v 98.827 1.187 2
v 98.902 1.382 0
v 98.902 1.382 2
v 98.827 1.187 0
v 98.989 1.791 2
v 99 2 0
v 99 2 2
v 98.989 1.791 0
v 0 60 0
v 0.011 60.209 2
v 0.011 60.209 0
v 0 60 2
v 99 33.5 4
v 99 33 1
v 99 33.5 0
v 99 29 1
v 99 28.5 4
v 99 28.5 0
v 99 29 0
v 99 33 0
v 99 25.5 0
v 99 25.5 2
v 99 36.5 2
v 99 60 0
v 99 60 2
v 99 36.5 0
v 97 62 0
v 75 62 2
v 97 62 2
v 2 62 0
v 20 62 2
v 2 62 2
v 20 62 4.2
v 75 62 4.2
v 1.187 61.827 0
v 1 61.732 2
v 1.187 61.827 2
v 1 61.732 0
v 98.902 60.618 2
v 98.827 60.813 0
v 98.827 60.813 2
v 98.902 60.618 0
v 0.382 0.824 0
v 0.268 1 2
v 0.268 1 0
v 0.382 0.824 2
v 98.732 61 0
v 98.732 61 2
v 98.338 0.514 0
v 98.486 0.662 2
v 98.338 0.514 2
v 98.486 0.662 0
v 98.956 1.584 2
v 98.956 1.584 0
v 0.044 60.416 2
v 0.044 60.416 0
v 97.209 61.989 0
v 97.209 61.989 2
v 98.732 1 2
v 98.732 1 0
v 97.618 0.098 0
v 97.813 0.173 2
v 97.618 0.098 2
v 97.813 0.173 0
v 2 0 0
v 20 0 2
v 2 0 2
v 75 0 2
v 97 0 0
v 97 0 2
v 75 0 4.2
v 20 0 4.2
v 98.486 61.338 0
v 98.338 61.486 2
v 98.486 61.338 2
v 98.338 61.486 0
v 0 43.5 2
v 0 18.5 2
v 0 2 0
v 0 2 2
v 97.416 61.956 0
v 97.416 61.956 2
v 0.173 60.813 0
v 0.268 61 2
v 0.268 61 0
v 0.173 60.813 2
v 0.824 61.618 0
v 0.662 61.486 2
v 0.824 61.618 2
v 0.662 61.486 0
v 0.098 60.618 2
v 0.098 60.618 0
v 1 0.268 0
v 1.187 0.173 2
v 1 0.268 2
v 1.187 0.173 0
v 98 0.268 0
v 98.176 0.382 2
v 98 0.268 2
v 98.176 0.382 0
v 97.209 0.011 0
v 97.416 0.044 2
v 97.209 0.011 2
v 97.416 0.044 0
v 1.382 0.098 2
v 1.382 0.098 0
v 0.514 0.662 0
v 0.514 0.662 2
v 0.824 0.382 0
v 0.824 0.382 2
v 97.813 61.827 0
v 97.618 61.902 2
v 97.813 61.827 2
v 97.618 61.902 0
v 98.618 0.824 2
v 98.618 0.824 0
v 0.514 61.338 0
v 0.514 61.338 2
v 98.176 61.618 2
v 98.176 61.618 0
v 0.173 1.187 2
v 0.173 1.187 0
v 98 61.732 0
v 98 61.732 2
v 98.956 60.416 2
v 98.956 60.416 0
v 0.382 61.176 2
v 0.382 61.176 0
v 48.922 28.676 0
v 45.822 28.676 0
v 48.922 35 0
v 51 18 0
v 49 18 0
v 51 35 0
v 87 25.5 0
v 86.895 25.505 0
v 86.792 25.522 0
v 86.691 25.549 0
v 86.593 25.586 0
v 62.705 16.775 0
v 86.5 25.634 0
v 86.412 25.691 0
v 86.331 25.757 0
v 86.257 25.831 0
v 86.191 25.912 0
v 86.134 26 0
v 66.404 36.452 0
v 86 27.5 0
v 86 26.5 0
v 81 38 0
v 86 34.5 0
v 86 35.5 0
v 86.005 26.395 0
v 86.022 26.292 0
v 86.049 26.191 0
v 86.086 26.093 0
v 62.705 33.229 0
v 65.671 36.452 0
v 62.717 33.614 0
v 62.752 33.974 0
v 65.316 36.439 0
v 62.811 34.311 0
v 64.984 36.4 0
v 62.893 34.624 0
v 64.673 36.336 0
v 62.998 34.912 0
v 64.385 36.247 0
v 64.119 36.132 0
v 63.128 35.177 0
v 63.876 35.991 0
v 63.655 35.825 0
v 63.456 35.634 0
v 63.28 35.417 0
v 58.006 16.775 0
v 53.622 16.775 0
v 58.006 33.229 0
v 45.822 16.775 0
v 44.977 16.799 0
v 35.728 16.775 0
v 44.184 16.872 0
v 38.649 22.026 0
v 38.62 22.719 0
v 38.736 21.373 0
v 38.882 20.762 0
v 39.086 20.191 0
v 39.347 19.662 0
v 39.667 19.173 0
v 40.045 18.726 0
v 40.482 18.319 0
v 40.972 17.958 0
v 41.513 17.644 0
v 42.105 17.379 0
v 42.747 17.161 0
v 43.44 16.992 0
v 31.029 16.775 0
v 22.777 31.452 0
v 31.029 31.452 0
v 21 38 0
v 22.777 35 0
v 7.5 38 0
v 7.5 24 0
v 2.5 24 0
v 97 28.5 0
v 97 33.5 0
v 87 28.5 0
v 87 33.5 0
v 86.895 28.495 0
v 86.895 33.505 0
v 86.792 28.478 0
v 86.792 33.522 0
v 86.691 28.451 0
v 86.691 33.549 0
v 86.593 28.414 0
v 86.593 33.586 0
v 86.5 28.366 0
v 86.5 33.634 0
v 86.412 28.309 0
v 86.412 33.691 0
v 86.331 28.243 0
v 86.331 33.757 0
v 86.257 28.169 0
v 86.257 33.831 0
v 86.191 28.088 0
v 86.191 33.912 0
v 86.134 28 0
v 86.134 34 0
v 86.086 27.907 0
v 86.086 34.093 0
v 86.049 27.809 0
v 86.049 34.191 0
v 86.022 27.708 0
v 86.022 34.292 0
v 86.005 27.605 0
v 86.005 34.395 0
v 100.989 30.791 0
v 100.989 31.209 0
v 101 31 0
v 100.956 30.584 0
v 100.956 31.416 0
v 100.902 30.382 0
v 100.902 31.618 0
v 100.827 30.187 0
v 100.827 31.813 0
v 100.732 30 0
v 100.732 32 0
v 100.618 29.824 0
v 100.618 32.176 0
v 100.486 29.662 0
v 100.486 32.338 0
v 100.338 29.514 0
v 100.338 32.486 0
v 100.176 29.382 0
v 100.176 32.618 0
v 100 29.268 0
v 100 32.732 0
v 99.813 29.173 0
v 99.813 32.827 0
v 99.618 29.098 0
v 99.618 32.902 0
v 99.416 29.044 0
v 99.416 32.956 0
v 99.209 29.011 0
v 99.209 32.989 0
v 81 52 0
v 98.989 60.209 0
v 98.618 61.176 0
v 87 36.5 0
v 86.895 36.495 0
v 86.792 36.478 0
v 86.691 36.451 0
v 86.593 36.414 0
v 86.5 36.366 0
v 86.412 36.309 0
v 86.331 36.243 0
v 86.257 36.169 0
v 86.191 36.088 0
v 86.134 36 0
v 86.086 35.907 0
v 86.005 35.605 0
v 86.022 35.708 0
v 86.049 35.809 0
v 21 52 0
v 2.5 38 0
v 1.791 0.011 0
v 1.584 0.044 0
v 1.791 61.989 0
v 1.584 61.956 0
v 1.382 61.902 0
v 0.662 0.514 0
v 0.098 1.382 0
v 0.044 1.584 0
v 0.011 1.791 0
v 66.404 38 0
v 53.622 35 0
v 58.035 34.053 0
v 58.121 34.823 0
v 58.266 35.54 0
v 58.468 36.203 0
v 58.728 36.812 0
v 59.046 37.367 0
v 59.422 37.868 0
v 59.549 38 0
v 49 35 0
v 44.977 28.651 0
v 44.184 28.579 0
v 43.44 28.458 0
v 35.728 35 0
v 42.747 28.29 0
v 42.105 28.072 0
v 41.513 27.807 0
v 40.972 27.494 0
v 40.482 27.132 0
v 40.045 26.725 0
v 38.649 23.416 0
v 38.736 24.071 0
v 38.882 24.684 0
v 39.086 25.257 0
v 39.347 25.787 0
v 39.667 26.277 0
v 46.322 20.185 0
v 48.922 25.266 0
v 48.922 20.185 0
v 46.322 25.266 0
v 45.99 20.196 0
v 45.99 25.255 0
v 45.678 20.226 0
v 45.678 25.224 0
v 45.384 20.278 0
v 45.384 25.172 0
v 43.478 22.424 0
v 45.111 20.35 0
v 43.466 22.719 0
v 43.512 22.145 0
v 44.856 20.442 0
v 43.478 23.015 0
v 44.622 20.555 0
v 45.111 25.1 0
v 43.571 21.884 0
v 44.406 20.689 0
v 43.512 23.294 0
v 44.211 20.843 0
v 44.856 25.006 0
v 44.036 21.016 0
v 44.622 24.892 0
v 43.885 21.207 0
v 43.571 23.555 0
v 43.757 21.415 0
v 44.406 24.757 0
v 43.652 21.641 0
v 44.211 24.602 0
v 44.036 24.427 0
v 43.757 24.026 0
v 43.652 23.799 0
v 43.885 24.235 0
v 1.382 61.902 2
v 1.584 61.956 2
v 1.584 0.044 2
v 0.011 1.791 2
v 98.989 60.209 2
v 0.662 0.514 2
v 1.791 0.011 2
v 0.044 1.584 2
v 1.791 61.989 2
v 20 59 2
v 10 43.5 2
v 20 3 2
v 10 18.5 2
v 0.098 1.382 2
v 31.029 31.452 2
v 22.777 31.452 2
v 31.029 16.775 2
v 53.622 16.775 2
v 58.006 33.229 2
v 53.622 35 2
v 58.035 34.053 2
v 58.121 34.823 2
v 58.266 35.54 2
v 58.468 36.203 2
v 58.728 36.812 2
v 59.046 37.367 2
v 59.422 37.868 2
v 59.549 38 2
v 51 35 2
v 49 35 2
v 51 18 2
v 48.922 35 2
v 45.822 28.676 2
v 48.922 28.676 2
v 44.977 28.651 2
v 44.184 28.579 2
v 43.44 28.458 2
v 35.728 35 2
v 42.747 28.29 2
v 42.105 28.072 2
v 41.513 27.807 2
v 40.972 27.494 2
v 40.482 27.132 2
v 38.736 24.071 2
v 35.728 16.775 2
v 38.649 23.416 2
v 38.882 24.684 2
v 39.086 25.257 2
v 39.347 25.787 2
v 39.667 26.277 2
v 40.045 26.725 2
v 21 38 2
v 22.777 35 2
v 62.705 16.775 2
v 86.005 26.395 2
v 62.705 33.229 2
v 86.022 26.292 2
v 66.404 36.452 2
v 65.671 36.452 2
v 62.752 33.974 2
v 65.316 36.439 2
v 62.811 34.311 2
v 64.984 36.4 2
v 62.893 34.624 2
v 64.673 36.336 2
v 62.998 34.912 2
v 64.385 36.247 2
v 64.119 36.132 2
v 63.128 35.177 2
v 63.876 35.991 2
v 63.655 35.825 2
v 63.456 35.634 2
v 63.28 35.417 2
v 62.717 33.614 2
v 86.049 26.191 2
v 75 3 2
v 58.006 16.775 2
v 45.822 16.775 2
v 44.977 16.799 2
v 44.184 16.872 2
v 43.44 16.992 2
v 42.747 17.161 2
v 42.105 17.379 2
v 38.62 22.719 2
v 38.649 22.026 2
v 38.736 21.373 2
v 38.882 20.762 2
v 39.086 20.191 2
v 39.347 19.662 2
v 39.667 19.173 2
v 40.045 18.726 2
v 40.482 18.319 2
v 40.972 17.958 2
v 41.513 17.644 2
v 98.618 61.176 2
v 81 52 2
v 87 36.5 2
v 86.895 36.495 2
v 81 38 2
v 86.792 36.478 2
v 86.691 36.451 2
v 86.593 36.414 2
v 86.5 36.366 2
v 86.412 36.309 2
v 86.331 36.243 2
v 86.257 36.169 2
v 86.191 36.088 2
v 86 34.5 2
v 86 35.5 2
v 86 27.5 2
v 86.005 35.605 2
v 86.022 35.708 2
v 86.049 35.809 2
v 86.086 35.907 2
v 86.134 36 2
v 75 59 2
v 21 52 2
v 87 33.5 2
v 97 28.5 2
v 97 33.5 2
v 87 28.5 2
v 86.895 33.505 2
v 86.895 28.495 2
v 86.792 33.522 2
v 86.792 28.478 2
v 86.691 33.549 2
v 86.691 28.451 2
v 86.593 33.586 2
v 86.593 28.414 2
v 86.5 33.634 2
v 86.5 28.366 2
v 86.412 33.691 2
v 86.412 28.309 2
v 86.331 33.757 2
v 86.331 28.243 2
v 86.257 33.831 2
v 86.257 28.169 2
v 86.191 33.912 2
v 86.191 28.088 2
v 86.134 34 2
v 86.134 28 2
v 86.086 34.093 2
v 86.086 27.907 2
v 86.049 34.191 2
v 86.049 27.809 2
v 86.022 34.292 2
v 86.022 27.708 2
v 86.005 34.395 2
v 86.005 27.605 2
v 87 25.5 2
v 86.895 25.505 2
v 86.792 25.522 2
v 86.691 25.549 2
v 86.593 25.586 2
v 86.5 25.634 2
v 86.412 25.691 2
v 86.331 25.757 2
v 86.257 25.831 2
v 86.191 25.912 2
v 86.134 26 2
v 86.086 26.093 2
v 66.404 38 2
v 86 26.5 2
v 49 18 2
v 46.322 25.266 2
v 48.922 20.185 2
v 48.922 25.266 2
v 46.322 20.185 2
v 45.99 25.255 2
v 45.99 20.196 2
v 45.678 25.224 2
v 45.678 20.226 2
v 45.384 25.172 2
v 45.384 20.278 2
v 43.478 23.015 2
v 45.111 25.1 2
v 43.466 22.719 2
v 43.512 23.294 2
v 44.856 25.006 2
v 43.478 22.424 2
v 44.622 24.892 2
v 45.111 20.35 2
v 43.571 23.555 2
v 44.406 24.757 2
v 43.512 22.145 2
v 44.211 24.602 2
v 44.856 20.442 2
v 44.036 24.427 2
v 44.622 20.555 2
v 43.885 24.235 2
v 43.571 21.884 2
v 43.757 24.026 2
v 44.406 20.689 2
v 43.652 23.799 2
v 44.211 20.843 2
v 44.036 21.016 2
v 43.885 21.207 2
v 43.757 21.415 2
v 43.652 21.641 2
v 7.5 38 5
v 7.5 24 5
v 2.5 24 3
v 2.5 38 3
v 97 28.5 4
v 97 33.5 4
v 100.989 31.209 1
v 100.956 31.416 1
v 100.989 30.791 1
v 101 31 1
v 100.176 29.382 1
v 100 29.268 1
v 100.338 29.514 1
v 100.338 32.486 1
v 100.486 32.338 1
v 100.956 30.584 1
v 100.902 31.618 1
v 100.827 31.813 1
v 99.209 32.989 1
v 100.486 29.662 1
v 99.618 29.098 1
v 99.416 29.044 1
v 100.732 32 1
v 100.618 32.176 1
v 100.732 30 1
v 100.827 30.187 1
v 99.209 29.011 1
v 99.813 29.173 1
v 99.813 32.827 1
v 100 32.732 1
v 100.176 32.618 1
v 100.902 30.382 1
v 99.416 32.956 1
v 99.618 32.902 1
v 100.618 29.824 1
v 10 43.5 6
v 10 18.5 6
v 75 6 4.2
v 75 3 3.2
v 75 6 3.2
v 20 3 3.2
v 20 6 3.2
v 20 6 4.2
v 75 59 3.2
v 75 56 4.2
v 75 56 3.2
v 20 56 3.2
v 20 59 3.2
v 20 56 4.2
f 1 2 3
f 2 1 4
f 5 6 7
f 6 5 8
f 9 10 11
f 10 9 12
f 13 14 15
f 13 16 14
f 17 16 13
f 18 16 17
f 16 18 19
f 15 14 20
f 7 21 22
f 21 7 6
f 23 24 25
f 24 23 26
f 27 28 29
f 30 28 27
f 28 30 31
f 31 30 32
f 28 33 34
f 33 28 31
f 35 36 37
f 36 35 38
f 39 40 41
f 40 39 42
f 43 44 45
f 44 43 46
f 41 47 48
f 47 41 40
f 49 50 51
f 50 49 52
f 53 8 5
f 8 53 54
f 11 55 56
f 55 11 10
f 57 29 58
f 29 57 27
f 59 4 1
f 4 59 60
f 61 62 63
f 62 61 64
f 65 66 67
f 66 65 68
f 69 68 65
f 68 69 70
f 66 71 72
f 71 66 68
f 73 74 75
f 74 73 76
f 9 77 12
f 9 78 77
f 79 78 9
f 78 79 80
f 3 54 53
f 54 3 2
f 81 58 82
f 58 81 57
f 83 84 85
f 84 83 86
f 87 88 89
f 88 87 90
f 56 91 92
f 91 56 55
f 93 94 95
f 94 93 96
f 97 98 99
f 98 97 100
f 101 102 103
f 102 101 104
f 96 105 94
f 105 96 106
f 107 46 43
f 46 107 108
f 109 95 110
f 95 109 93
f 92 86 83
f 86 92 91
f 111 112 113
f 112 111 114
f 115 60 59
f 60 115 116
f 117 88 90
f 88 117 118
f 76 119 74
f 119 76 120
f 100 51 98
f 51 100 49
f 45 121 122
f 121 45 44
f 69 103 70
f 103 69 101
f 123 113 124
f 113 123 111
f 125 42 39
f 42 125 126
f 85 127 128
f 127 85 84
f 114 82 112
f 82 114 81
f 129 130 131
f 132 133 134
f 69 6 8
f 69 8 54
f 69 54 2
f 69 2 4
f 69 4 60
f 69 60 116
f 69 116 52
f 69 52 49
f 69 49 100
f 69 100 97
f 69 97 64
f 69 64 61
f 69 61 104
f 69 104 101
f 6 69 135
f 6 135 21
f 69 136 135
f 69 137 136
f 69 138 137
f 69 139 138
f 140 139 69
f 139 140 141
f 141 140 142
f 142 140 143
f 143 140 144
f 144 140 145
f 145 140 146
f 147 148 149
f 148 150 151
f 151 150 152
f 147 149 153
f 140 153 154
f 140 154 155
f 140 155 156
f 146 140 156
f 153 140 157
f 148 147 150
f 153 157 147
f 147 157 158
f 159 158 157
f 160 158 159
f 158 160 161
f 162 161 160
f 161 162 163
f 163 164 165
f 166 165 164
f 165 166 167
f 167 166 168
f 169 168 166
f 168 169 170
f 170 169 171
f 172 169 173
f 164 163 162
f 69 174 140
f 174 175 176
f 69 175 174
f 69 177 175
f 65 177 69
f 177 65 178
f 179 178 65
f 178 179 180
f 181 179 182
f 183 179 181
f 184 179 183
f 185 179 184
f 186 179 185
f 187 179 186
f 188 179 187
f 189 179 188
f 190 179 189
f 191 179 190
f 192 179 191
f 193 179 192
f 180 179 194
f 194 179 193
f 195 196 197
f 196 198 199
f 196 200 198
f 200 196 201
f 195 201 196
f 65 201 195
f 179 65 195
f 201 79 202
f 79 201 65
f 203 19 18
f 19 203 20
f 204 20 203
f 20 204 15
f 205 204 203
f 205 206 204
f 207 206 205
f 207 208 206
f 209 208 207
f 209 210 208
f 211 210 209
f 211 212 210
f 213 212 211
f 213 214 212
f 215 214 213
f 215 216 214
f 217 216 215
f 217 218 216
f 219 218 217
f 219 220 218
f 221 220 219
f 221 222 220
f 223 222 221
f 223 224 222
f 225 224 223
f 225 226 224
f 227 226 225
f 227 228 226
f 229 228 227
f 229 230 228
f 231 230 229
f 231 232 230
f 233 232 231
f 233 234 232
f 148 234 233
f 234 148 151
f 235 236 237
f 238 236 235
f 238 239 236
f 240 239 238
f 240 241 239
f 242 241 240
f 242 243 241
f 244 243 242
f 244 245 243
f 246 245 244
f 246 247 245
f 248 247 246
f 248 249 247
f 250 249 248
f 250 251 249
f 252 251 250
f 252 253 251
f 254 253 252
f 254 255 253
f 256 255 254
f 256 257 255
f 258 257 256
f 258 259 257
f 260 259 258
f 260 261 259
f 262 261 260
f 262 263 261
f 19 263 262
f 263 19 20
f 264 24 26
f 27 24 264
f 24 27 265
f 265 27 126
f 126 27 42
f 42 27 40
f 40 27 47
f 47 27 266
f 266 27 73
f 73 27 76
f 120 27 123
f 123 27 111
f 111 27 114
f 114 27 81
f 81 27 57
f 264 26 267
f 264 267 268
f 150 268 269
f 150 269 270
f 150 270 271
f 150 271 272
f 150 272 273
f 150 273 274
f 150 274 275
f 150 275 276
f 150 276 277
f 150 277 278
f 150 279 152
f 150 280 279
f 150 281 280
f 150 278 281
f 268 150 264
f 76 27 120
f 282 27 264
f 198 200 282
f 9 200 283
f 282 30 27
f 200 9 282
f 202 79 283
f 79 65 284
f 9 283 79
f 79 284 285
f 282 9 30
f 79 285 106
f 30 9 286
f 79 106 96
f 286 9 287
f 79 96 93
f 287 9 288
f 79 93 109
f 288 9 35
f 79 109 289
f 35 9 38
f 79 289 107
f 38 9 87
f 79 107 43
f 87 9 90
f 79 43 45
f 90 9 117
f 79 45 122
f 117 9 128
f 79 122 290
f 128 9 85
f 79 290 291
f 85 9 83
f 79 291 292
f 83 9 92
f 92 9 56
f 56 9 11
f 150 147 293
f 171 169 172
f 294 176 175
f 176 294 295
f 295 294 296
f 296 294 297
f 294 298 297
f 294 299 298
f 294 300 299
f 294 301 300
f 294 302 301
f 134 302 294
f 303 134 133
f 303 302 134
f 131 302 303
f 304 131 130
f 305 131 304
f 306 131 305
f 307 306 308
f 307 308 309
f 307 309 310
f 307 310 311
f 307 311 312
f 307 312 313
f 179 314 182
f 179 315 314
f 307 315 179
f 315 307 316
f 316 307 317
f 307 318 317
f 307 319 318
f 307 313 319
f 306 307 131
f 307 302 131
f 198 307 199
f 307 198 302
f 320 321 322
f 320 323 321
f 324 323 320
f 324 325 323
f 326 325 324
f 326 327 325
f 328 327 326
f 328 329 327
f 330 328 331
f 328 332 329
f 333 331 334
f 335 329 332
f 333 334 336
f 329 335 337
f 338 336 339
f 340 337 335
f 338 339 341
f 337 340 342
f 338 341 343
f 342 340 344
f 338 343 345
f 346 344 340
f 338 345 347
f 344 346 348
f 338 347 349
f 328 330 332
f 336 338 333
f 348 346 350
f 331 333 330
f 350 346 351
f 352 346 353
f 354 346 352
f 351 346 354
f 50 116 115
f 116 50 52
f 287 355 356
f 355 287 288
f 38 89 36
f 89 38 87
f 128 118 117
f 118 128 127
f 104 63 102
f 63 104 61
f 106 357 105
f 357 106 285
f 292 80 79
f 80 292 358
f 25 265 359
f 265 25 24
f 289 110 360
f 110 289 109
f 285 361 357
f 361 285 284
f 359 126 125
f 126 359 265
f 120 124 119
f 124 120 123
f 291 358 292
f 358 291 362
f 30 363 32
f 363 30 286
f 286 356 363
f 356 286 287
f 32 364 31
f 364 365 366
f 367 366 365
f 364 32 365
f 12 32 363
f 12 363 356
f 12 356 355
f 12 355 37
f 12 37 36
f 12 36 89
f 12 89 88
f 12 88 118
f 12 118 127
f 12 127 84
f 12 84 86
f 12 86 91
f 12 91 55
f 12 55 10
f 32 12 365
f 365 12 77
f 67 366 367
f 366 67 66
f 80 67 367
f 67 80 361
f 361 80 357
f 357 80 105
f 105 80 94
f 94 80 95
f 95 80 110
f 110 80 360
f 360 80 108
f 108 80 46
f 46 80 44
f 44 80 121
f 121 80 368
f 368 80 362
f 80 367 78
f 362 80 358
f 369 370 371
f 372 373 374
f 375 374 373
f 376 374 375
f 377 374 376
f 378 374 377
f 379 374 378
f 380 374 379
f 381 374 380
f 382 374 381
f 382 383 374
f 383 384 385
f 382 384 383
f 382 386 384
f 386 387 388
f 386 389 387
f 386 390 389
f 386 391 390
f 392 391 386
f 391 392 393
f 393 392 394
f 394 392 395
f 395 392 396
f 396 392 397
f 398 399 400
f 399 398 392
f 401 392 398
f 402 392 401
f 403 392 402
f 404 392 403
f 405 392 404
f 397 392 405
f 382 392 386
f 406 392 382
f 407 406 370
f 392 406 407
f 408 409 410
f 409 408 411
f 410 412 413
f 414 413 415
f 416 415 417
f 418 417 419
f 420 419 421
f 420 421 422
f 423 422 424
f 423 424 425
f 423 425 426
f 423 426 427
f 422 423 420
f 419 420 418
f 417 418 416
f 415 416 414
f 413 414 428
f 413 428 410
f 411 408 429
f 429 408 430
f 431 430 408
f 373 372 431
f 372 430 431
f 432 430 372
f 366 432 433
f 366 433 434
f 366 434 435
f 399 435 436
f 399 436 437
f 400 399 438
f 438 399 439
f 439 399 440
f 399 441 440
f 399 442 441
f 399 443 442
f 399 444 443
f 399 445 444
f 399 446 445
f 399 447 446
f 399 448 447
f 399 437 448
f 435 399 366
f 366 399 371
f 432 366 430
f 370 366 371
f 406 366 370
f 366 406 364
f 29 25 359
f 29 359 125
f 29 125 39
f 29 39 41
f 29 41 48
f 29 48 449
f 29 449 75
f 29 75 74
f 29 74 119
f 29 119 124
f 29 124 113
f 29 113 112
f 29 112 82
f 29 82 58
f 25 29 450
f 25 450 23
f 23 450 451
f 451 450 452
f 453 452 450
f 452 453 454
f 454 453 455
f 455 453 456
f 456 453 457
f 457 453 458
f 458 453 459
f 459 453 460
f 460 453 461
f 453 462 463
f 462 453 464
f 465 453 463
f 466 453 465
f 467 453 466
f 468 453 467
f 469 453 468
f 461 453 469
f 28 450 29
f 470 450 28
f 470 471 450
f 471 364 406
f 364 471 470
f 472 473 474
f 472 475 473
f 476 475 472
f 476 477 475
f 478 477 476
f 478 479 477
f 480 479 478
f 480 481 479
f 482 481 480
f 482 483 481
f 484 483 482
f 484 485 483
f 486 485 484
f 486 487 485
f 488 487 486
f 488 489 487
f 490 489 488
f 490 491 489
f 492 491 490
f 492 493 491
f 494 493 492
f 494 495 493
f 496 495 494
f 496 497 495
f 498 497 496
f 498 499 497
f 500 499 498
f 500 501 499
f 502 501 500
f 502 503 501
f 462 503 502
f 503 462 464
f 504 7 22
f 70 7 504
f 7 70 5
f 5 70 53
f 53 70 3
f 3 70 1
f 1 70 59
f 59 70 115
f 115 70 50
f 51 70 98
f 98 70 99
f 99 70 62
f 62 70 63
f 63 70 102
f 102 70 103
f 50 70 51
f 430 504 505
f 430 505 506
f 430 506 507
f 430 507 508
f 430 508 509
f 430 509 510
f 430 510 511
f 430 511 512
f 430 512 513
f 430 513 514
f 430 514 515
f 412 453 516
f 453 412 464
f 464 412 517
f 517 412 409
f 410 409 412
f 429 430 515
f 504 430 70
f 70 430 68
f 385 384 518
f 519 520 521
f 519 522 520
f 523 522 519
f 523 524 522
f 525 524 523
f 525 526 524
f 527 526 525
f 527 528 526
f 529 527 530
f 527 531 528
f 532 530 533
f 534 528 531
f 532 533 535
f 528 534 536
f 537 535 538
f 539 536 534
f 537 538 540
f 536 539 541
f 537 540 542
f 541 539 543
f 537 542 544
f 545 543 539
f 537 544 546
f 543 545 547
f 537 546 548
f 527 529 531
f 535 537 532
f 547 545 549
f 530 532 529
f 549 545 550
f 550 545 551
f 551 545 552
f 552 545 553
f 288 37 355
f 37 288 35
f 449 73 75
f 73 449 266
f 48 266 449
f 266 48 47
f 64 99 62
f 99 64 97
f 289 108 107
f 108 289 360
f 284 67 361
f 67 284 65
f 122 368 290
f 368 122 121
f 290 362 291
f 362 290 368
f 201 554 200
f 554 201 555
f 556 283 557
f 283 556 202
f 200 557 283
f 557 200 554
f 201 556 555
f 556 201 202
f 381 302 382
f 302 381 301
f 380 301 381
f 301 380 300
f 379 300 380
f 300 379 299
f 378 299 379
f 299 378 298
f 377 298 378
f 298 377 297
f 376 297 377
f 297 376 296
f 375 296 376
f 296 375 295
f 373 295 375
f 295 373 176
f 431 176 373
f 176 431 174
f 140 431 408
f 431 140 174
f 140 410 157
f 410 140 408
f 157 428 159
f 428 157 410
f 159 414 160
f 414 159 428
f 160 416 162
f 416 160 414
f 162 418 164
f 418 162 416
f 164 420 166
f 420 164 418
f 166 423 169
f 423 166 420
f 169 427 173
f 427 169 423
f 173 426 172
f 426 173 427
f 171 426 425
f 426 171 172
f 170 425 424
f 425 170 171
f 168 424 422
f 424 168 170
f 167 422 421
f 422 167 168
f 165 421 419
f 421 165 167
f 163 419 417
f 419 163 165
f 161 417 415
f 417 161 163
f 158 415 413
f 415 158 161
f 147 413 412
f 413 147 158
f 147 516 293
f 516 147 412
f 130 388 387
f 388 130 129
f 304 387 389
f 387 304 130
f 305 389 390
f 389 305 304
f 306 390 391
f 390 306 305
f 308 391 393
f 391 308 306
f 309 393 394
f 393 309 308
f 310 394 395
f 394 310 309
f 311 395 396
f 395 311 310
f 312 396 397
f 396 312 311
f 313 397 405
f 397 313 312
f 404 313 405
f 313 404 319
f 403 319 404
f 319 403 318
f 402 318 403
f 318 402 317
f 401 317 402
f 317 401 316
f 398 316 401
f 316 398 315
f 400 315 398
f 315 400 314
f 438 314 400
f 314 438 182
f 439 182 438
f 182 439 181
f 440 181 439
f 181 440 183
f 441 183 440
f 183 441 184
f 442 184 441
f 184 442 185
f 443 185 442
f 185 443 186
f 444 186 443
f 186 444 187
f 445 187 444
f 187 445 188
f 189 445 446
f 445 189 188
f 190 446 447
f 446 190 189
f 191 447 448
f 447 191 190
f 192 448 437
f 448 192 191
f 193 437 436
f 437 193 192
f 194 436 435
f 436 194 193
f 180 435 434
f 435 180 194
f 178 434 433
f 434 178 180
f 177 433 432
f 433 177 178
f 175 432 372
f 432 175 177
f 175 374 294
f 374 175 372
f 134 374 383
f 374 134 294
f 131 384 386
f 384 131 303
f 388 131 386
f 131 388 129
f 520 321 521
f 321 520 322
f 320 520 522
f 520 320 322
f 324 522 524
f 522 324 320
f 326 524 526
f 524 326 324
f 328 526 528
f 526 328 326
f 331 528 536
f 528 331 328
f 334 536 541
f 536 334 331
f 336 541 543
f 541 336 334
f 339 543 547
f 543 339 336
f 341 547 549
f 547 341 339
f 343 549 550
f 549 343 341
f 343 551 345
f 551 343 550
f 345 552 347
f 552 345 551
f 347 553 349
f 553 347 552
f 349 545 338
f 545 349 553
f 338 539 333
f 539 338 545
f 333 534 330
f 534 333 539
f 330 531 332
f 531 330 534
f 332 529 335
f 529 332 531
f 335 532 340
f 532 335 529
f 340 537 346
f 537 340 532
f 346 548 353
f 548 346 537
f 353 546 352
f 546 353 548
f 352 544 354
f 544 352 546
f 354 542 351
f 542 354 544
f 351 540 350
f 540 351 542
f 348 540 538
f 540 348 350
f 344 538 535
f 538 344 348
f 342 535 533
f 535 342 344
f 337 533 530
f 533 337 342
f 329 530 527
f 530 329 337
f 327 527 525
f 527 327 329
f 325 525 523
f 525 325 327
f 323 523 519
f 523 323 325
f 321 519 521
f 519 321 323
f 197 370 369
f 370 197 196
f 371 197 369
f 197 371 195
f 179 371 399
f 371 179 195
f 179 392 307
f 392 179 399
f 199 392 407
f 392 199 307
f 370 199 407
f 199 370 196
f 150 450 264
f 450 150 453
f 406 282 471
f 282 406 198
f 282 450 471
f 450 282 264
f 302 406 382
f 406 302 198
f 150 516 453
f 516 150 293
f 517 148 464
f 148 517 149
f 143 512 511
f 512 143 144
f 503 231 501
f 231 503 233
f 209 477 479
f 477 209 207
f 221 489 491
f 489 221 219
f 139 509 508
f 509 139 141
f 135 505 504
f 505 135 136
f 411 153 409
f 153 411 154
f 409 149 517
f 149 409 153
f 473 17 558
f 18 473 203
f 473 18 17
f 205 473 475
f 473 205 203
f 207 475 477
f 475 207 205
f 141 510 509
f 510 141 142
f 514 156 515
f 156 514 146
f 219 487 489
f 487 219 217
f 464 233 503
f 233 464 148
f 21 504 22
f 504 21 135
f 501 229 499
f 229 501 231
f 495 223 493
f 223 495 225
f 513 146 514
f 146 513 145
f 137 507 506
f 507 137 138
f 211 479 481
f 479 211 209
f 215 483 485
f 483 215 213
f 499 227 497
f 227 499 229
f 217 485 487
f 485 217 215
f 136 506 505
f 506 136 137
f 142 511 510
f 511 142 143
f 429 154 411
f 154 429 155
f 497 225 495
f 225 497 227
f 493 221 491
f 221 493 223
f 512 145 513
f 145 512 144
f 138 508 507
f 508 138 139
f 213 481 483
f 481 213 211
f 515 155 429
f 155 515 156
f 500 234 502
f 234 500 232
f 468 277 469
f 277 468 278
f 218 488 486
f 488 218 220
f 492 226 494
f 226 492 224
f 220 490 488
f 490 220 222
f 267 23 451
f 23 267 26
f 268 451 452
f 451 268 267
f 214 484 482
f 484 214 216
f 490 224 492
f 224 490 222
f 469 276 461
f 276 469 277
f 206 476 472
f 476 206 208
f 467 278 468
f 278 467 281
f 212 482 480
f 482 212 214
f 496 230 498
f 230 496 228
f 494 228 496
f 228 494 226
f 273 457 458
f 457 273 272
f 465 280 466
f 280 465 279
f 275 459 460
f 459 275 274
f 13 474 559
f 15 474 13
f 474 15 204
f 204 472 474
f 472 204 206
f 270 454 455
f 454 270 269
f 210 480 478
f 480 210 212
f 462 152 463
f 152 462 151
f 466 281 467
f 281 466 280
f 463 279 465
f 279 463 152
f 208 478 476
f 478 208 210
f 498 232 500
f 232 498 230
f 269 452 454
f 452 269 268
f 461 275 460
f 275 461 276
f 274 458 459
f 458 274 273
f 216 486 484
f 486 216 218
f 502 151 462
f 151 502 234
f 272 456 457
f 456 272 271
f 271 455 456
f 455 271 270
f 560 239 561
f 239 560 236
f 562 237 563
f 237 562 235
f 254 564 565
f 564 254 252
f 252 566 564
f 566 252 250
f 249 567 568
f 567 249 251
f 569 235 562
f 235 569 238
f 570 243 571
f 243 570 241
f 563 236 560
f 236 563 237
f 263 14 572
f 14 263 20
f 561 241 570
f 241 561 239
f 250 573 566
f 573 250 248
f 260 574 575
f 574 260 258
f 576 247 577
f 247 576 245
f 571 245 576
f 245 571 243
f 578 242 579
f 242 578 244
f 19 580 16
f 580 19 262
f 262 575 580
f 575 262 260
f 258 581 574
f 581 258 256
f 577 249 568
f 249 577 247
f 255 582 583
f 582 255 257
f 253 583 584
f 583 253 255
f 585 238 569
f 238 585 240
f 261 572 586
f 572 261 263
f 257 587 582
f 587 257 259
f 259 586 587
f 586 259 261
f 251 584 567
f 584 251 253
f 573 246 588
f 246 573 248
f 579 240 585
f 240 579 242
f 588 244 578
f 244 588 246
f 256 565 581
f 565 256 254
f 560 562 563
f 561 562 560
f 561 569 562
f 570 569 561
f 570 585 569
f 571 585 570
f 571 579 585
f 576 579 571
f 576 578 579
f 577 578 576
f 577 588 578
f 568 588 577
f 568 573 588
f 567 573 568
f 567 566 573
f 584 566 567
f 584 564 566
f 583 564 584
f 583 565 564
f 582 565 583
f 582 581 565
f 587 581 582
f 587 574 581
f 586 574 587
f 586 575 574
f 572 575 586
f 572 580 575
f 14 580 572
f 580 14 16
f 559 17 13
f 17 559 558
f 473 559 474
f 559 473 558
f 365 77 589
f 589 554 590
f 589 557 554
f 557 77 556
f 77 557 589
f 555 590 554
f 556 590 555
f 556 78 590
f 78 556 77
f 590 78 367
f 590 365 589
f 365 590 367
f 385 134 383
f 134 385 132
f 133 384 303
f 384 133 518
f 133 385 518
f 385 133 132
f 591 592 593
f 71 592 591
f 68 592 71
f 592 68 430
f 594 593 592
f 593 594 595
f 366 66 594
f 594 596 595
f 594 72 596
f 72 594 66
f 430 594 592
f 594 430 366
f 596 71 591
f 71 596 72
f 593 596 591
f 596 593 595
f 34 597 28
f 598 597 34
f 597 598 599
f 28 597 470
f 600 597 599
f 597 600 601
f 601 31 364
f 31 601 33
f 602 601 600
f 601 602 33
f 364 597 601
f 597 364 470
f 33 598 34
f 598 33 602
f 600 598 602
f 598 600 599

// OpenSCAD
$fn=60;
personal_badge                              = 0; 

// ====================== CONFIG ======================
badge_width                                 = 56;
badge_length                                = 87;
badge_thickness                             = 1.2;
badge_rounding                              = 2;
// ----------------------------------------------------
badge_holder_thickness                      = 2;
badge_holder_rounding                       = 2;
badge_holder_lanyard_length                 = 10;
// ----------------------------------------------------
badge_holder_lanyard_clip_width             = 25;
badge_holder_lanyard_clip_thickness         = 4;
badge_holder_lanyard_hole_width             = 14;
badge_holder_lanyard_hole_length            = 5;
badge_holder_lanyard_hole_y_offset          = 2.5;
// ----------------------------------------------------
//badge_holder_logo_picture                   = "jpl.png";
badge_holder_logo_text                      = "JPL";
badge_holder_logo_text_size                 = 18;
badge_holder_logo_text_font                 = "Calibri:style=Bold";
badge_holder_logo_yoffset                   = 65;
badge_holder_logo_xoffset                   = 35;
// ----------------------------------------------------
badge_holder_bar_code_length                = 60;
badge_holder_bar_code_width                 = 14;
badge_holder_bar_code_yoffset               = 21;
badge_holder_bar_code_xoffset               = 38;
// ----------------------------------------------------
badge_holder_side_bracket_top_thickness     = 1;
badge_holder_side_bracket_yoffset           = 20;
badge_holder_side_bracket_length            = 55;
badge_holder_side_bracket_width             = 3;
badge_holder_side_bracket_top_width         = 6;
// ----------------------------------------------------
badge_holder_bottom_clip_peg_base_radius    = 2;
badge_holder_bottom_clip_peg_base_height    = 1;
badge_holder_bottom_clip_peg_length         = 2;
badge_holder_bottom_clip_peg_width          = 5;
badge_holder_bottom_clip_peg_height         = 4;
badge_holder_bottom_clip_length             = 14;
badge_holder_bottom_clip_width              = 8;
badge_holder_bottom_clip_roundness          = 1;
badge_holder_bottom_clip_cutout_length      = badge_holder_bottom_clip_length;
badge_holder_bottom_clip_cutout_width       = 3;
badge_holder_bottom_clip_cutout_rounding    = 1;
// ----------------------------------------------------
badge_holder_width                  = badge_width + (2*badge_holder_side_bracket_width);
badge_holder_length                 = badge_length + badge_holder_lanyard_length + badge_holder_bottom_clip_peg_length;
badge_holder_lanyard_hole_x_offset  = (badge_holder_width/2)-(badge_holder_lanyard_hole_width/2);
// =================================


// Badge
%translate([badge_holder_lanyard_length,
            badge_holder_side_bracket_width,
            badge_holder_thickness])
{
    RoundedCube(    badge_length,
                    badge_width,
                    badge_thickness,
                    badge_rounding);
}

// ------------ Badge Holder ------------
// Main Body w/ Cut Outs
difference()
{
    // Primary Backing
    RoundedCube(    badge_holder_length,
                    badge_holder_width,
                    badge_holder_thickness,
                    badge_holder_rounding);
    
    // Lanyard hole in primary backing
    translate([badge_holder_lanyard_hole_y_offset,badge_holder_lanyard_hole_x_offset,0])
    {
        cube([  badge_holder_lanyard_hole_length,
                badge_holder_lanyard_hole_width,
                badge_holder_thickness]); 
    }
    // Subtract out the JPL logo Text
    translate([badge_holder_logo_yoffset,badge_holder_logo_xoffset,0])
    {
        rotate([180,180,0])
        {
            // For some reason I have to add .1 mm to the text to ensure it full slices out
            // of the background shape
            #linear_extrude(badge_holder_thickness+.1)
            {
                //surface(file=badge_holder_logo_picture,invert=true); 
                //import(badge_holder_logo_picture); 
                text(   badge_holder_logo_text, 
                        size = badge_holder_logo_text_size, 
                        font = badge_holder_logo_text_font );
            }
        }
    }
    if(personal_badge)
    {
        // Add my signature "MIKE"
        translate([badge_holder_length-4,badge_holder_width/2+7+20,2.1])
        {
            rotate([0,180,90])
            {
                // For some reason I have to add .1 mm to the text to ensure it full slices out
                // of the background shape
                #linear_extrude(badge_holder_thickness+.2)
                {
                    //surface(file=badge_holder_logo_picture,invert=true); 
                    //import(badge_holder_logo_picture); 
                    text(   "MIKE", 
                            size = badge_holder_logo_text_size/3, 
                            font = badge_holder_logo_text_font );
                }
            }
        }
        // Add my signature "WADE"
        translate([badge_holder_length-4,2+22,2.1])
        {
            rotate([0,180,90])
            {
                // For some reason I have to add .1 mm to the text to ensure it full slices out
                // of the background shape
                #linear_extrude(badge_holder_thickness+.2)
                {
                    //surface(file=badge_holder_logo_picture,invert=true); 
                    //import(badge_holder_logo_picture); 
                    text(   "WADE", 
                            size = badge_holder_logo_text_size/3, 
                            font = badge_holder_logo_text_font );
                }
            }
        }
    }
    
    // Scannable Hole
    translate([badge_holder_bar_code_yoffset,badge_holder_bar_code_xoffset,0])
    {
        cube([  badge_holder_bar_code_length,
                badge_holder_bar_code_width,
                badge_holder_thickness]); 
    }
    
    // Bottom Clip Bracket Cutouts (RIGHT&LEFT)
    translate([ badge_holder_length - badge_holder_bottom_clip_cutout_length + badge_holder_bottom_clip_cutout_rounding,
                (badge_holder_width/2)-(badge_holder_bottom_clip_width/2)-(badge_holder_bottom_clip_cutout_width/2),
                0])
    {
        RoundedCube(    badge_holder_bottom_clip_cutout_length,
                        badge_holder_bottom_clip_cutout_width,
                        badge_holder_thickness,
                        badge_holder_bottom_clip_roundness);
    }
    translate([ badge_holder_length - badge_holder_bottom_clip_cutout_length + badge_holder_bottom_clip_cutout_rounding,
                (badge_holder_width/2)+(badge_holder_bottom_clip_width/2)-(badge_holder_bottom_clip_cutout_width/2),
                0])
    {
        RoundedCube(    badge_holder_bottom_clip_cutout_length,
                        badge_holder_bottom_clip_cutout_width,
                        badge_holder_thickness,
                        badge_holder_bottom_clip_roundness);
    }
}
// JPL "P" Bridge
// FIXME: WADE - This is just a 3D printing patch due to the "P" having a gap
// internal to the letter that we need to bridge so it sticks to the rest of the 
// part   
translate([49,18,0])cube([2,badge_holder_logo_text_size,badge_holder_thickness]);



// Badge Side Holder Bracket (LEFT)
translate([ badge_holder_side_bracket_yoffset,
            0,
            badge_holder_thickness])
{
    cube([  badge_holder_side_bracket_length,
            badge_holder_side_bracket_width,
            badge_thickness]); 
}
translate([ badge_holder_side_bracket_yoffset,
            0,
            badge_holder_thickness+badge_thickness])
{
    cube([  badge_holder_side_bracket_length,
            badge_holder_side_bracket_top_width,
            badge_holder_side_bracket_top_thickness]);
}
// Badge Side Holder Bracket (RIGHT)
translate([ badge_holder_side_bracket_yoffset,
            badge_holder_width-badge_holder_side_bracket_width,
            badge_holder_thickness])
{
    cube([  badge_holder_side_bracket_length,
            badge_holder_side_bracket_width,
            badge_thickness]); 
}
translate([ badge_holder_side_bracket_yoffset,
            badge_holder_width-badge_holder_side_bracket_width-(badge_holder_side_bracket_top_width/2),
            badge_holder_thickness+badge_thickness])
{
    cube([  badge_holder_side_bracket_length,
            badge_holder_side_bracket_top_width,
            badge_holder_side_bracket_top_thickness]);
}



// Badge Bottom Clip Bracket
translate([badge_holder_length,badge_holder_width/2,0])
{
    cylinder(h=badge_holder_bottom_clip_peg_base_height,r=badge_holder_bottom_clip_peg_base_radius);     
    translate([0,-(badge_holder_bottom_clip_peg_width/2),0])
    {
        rotate([0,0,90])
        {
            // Create the "stopper" Peg
            cube([  badge_holder_bottom_clip_peg_width,
                    badge_holder_bottom_clip_peg_length,
                    badge_holder_bottom_clip_peg_height]);
        }
    }
}

/**/
// Lanyard Location
translate([ badge_holder_lanyard_length,
            (badge_holder_width/2)+(badge_holder_lanyard_clip_width/2),
            badge_holder_thickness])
{
    // Build the Trapazoidal Lanyard Clip & Whole
    difference()
    {
        rotate([0,0,-180])
        {
            prism(badge_holder_lanyard_clip_width,badge_holder_lanyard_length,badge_holder_lanyard_clip_thickness);
        }
        rotate([0,0,-180])
        {
            translate([badge_holder_lanyard_hole_y_offset,(badge_holder_lanyard_clip_width-badge_holder_lanyard_hole_width)/2,0])
            {
                cube([  badge_holder_lanyard_hole_length,
                        badge_holder_lanyard_hole_width,
                        badge_holder_lanyard_clip_thickness]); 
            }
        }
    }
}
// Creation of a Box with X/Y/Z size, and rounded
// corners with R width
module RoundedCube(xdim ,ydim ,zdim,rdim)
{
    hull()
    {
        translate([rdim,rdim,0])cylinder(h=zdim,r=rdim);
        translate([xdim-rdim,rdim,0])cylinder(h=zdim,r=rdim);
        translate([rdim,ydim-rdim,0])cylinder(h=zdim,r=rdim);
        translate([xdim-rdim,ydim-rdim,0])cylinder(h=zdim,r=rdim);
    }
}

// Used for Trapazoid "wedges"
module prism(l, w, h) 
{
       polyhedron(points=[
               [0,0,h],           // 0    front top corner
               [0,0,0],[w,0,0],   // 1, 2 front left & right bottom corners
               [0,l,h],           // 3    back top corner
               [0,l,0],[w,l,0]    // 4, 5 back left & right bottom corners
       ], faces=[ // points for all faces must be ordered clockwise when looking in
               [0,2,1],    // top face
               [3,4,5],    // base face
               [0,1,4,3],  // h face
               [1,2,5,4],  // w face
               [0,3,5,2],  // hypotenuse face
       ]);
}
